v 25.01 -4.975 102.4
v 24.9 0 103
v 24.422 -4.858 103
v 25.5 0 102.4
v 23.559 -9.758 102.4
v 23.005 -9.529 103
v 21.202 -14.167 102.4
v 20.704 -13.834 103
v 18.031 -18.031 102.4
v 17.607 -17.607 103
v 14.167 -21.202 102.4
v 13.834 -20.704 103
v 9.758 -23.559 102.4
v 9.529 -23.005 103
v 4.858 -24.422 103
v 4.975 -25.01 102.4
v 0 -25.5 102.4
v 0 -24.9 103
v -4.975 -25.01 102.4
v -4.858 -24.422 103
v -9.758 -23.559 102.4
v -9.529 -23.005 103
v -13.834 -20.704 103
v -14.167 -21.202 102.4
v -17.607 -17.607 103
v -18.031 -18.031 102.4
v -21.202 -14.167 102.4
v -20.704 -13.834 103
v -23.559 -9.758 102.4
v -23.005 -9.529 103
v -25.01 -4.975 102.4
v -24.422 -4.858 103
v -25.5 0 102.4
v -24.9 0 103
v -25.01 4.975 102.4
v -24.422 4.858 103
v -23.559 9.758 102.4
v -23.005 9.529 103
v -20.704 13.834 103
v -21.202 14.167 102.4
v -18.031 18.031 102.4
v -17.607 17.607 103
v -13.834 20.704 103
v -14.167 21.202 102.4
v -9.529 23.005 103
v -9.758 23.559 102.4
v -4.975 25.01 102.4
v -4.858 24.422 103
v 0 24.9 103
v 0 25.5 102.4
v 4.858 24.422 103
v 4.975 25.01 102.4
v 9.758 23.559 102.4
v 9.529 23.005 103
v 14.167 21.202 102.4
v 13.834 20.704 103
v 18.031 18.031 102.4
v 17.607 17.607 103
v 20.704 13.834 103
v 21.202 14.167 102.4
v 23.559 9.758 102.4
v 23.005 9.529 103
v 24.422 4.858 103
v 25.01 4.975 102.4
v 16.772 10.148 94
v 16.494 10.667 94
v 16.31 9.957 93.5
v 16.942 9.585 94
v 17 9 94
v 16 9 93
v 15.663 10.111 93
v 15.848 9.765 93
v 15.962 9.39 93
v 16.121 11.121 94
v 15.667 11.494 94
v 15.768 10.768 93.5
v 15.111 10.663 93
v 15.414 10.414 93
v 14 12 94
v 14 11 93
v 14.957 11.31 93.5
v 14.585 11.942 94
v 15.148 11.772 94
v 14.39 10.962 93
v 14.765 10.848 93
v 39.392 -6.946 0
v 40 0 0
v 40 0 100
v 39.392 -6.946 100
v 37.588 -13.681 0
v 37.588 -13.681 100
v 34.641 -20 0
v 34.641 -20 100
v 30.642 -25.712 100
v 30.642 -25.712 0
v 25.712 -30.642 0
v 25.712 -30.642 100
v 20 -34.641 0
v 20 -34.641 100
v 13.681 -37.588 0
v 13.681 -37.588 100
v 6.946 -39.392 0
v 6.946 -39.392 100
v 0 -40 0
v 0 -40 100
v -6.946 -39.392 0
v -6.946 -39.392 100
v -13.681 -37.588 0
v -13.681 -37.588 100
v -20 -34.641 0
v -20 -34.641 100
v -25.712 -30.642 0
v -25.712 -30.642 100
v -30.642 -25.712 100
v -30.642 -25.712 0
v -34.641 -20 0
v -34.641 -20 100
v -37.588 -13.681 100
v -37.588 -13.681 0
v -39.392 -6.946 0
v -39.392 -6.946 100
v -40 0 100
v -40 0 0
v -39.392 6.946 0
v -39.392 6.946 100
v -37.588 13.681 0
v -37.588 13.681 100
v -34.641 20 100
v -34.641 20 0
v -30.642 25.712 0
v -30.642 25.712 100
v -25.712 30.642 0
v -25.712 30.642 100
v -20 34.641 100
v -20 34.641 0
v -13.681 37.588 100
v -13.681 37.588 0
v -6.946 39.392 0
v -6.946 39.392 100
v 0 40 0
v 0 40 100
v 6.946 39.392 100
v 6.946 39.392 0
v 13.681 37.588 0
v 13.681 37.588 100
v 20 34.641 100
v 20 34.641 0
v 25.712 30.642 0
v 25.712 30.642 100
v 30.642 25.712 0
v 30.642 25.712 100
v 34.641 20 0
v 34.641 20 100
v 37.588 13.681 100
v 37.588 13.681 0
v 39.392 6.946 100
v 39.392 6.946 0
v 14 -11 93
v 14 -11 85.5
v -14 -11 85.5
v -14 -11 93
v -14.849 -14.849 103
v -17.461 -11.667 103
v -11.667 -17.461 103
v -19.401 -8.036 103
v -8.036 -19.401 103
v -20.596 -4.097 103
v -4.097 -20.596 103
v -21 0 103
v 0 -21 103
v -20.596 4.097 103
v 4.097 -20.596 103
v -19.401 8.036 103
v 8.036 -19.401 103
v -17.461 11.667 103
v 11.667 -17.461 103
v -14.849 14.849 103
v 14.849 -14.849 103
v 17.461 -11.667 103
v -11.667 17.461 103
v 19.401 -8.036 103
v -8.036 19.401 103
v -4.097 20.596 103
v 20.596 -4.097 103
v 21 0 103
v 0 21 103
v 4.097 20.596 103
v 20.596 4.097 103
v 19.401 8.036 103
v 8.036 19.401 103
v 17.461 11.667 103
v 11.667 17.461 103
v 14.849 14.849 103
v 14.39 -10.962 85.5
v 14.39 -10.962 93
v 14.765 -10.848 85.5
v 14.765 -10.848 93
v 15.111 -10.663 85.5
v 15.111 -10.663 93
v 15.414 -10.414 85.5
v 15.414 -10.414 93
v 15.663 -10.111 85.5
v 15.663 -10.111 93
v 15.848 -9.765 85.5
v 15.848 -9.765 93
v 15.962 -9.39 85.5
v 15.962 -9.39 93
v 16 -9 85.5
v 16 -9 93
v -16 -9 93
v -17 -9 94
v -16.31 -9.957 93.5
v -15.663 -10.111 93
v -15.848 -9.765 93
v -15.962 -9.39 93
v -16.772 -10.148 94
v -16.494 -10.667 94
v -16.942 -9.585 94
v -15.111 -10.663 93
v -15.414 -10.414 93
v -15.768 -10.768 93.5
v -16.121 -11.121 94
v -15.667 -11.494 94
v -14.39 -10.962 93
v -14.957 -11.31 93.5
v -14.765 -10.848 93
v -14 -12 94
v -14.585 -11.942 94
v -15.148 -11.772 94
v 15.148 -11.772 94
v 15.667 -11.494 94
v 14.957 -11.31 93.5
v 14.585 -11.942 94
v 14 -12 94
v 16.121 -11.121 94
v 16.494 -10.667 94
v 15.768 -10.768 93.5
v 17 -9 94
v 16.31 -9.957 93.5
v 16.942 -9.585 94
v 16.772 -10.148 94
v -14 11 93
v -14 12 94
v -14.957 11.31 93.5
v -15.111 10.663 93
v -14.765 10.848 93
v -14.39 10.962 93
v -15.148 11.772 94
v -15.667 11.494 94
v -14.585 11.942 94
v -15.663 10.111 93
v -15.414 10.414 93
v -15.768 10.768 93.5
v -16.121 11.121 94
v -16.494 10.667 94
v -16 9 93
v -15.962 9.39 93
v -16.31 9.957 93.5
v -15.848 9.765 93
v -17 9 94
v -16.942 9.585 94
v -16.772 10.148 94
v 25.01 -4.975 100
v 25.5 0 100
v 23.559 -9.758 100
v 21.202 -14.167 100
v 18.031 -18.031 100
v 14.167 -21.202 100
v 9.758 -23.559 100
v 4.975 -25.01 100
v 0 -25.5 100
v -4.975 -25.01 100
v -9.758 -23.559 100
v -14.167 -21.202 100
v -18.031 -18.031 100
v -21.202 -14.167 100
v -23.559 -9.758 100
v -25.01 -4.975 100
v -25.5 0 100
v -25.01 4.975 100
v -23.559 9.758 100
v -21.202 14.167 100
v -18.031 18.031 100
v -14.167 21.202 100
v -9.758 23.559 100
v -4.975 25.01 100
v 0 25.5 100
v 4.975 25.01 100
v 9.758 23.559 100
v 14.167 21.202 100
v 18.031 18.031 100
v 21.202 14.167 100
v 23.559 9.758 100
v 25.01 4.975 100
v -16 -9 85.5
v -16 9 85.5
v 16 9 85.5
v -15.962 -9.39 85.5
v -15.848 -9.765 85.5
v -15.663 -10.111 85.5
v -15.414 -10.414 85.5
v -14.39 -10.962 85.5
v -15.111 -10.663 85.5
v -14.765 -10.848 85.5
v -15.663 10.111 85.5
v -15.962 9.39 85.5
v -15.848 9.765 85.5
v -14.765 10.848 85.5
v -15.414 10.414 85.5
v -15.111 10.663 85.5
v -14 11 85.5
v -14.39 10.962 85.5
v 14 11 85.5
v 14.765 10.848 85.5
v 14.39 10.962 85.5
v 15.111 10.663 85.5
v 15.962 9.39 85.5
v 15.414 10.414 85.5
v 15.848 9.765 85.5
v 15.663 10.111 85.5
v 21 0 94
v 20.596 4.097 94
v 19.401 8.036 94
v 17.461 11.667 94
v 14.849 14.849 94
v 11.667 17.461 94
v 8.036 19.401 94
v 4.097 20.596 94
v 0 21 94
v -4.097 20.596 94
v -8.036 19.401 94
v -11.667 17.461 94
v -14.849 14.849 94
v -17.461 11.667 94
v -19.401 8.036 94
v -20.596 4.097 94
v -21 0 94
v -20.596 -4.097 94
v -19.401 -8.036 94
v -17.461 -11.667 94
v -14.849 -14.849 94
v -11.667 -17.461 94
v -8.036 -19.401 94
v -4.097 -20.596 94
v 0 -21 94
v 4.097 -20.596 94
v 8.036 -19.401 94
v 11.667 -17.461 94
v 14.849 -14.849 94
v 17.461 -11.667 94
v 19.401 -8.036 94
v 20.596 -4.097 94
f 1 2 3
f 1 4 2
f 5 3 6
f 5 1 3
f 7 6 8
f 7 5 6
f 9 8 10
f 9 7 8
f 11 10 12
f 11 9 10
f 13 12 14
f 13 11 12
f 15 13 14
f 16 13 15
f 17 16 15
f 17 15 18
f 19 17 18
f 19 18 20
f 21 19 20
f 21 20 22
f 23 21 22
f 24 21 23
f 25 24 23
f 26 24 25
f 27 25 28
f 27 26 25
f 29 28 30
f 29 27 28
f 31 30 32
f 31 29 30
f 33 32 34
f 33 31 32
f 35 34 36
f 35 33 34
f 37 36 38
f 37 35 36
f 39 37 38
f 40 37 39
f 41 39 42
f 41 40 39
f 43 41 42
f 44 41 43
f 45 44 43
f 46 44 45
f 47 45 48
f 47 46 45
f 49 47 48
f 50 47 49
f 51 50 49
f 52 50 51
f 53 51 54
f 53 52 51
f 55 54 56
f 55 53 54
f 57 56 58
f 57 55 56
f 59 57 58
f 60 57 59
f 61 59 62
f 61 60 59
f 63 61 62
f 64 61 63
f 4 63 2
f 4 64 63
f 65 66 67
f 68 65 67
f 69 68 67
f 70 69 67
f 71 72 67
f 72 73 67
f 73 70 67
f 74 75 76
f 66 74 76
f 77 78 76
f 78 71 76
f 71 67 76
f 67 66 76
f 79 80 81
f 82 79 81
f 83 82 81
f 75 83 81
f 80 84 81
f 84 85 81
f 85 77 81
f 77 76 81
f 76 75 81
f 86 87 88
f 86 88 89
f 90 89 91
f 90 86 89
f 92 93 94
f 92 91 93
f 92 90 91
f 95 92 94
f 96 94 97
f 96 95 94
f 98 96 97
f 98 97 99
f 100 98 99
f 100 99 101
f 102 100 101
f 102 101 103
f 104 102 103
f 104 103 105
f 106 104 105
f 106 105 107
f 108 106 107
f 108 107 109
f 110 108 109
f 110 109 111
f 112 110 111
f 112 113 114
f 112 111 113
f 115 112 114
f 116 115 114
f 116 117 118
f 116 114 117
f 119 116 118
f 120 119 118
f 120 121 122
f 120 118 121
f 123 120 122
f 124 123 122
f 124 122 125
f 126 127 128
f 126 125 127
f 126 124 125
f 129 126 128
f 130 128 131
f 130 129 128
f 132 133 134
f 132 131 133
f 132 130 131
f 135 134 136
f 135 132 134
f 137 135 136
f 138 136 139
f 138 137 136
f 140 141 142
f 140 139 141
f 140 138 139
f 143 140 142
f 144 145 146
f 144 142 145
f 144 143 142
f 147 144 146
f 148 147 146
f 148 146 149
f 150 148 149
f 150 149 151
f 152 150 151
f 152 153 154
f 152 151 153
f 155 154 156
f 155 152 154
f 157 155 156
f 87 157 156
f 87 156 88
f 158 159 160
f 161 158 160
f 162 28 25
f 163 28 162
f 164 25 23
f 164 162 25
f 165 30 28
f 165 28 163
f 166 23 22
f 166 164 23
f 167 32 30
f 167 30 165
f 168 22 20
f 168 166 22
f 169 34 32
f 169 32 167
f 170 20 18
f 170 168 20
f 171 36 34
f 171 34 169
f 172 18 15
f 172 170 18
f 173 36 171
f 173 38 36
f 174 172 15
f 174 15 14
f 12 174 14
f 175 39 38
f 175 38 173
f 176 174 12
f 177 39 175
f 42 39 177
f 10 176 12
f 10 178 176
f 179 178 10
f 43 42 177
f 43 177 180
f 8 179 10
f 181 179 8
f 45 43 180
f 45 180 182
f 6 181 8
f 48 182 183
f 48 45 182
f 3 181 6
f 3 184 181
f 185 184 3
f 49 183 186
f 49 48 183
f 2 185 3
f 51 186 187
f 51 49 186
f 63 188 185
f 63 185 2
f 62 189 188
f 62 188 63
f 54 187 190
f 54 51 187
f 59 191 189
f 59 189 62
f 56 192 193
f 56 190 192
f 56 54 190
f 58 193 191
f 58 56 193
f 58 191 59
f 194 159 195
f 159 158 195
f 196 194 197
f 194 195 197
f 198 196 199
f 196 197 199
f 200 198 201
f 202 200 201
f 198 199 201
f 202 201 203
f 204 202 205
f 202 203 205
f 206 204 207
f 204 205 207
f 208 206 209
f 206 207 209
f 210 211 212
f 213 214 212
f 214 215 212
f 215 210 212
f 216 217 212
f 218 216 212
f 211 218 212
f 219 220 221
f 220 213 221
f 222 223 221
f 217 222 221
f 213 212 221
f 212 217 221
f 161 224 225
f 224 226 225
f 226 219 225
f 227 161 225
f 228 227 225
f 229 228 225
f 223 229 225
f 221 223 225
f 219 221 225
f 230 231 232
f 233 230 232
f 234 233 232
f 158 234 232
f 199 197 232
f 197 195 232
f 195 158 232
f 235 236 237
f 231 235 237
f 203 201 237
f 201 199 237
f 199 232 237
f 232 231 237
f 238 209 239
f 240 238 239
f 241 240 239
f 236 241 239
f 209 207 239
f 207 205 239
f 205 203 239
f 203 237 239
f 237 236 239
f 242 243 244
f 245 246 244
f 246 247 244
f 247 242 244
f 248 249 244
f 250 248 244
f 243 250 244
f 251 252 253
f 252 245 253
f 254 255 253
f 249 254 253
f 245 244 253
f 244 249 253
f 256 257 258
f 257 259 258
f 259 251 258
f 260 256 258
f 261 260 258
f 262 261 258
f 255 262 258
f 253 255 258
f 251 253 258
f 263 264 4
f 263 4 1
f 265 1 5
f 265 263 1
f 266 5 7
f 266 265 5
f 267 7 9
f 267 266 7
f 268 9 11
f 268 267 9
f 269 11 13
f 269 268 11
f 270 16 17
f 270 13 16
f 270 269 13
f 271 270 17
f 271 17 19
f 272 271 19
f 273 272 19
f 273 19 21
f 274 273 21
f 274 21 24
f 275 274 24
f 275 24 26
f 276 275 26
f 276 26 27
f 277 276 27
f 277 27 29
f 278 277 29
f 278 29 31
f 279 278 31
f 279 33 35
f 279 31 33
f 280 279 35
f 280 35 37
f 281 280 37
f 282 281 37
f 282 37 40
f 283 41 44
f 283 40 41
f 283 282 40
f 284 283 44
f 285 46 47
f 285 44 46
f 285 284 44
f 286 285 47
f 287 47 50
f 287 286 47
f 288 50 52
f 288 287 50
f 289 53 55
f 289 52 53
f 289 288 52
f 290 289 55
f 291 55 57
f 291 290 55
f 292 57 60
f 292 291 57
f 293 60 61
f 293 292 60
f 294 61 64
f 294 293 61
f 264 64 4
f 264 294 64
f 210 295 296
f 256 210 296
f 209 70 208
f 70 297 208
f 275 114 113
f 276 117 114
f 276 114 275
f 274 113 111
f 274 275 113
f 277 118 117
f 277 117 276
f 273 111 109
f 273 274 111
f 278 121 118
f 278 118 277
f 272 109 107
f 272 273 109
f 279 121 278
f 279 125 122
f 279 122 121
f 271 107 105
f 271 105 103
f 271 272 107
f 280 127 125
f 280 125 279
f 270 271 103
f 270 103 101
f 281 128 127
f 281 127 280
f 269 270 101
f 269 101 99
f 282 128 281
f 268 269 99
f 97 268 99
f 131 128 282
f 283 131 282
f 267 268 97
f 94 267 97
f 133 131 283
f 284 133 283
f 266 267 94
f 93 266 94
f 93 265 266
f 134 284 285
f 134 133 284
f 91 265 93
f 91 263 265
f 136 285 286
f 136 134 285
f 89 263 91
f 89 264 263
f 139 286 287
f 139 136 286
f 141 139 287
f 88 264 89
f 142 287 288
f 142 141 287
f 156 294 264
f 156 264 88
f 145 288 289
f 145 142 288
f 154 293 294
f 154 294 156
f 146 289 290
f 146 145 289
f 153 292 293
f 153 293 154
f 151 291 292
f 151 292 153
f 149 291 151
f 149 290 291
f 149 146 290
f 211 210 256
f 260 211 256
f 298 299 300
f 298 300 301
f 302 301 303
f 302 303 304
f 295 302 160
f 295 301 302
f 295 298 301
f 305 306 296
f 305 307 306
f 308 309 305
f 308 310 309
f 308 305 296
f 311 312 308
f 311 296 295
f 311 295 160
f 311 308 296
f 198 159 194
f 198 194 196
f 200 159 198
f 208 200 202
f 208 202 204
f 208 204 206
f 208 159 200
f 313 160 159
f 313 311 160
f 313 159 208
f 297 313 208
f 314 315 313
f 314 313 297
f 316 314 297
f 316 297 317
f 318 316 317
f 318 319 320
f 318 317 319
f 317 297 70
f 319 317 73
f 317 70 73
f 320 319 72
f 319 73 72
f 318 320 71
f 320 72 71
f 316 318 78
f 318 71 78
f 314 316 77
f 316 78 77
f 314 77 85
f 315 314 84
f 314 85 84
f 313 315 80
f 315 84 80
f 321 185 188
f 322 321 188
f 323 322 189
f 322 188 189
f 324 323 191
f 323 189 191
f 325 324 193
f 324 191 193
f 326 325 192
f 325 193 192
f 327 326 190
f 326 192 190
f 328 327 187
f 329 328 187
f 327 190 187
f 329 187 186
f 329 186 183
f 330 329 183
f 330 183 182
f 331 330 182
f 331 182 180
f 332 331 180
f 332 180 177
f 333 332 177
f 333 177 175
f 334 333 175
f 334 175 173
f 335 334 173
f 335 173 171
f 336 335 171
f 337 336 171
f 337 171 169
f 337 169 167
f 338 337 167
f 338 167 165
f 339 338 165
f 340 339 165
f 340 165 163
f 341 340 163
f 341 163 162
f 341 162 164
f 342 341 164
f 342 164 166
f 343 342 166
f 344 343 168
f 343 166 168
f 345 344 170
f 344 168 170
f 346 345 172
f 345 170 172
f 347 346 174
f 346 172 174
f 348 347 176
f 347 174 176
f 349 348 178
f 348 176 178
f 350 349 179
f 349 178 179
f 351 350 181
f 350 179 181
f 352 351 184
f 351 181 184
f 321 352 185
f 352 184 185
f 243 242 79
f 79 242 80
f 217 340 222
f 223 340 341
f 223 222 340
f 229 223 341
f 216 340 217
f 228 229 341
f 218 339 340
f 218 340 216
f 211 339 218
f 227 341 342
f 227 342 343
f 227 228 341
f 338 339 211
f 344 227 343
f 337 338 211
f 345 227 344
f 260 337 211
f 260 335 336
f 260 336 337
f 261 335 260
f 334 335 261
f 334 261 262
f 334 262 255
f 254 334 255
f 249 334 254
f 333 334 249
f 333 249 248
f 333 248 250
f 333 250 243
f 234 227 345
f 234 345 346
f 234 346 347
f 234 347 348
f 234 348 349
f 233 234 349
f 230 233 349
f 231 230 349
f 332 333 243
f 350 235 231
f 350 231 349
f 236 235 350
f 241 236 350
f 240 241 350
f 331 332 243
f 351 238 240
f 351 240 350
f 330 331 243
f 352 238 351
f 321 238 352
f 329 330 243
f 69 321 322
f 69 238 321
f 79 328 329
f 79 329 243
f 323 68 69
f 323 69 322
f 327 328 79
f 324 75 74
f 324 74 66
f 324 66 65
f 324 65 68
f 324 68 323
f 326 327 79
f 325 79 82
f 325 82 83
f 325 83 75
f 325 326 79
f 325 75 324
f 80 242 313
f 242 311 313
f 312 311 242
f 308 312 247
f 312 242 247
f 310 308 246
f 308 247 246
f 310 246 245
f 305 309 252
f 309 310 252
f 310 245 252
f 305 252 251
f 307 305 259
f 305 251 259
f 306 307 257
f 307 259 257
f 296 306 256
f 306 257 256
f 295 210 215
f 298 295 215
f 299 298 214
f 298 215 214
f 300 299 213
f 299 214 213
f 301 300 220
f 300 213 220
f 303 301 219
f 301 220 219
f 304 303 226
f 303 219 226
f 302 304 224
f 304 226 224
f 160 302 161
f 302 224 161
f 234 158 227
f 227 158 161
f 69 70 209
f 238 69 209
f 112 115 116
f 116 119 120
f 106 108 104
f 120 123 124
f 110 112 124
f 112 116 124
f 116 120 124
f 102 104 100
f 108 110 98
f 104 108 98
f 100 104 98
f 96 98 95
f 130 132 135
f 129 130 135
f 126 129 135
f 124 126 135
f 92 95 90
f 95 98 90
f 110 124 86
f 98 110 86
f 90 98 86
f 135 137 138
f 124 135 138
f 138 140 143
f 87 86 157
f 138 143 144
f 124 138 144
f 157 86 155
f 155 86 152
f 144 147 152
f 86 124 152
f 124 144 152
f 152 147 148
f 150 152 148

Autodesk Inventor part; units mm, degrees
ref_plane "YZ Plane" through (0, 0, 0) normal (1, 0, 0) x (0, 1, 0)
ref_plane "XZ Plane" through (0, 0, 0) normal (0, 1, 0) x (-1, 0, 0)
ref_plane "XY Plane" through (0, 0, 0) normal (0, 0, 1) x (1, 0, 0)
sketch "Sketch1" plane through (0, 0, 0) normal (0, 0, 1) x (1, 0, 0)
  circle A0 centre (0, 0) radius 40
  dimension "d0" = 80
extrude "Extrusion1" add sketch "Sketch1" along normal blind 100
sketch "Sketch2" plane through (0, 0, 100) normal (0, 0, 1) x (1, 0, 0)
  circle A0 centre (0, 0) radius 25.5
  dimension "d3" = 51
extrude "Extrusion2" add sketch "Sketch2" along normal blind 3
chamfer "Chamfer1" distance 0.6 angle 45 1 edges at (-25.5, 0, 103)
sketch "Sketch3" plane through (0, 0, 103) normal (0, 0, 1) x (1, 0, 0)
  circle A0 centre (0, 0) radius 21
  dimension "d9" = 42
extrude "SensorCutout" cut sketch "Sketch3" against normal blind 17.5
thread "Thread1" size "M42x1" class "6H" standard "ANSI Metric M Profile" full length
sketch "Sketch4" plane through (0, 0, 85.5) normal (0, 0, 1) x (1, 0, 0)
  line L0 (-16, 11) -> (16, 11)
  line L1 (16, 11) -> (16, -11)
  line L2 (16, -11) -> (-16, -11)
  line L3 (-16, -11) -> (-16, 11)
  circle A0 centre (0, 0) radius 21 projected
  point P0 (16, 0)
  point P1 (0, 11)
  dimension "d14" = 32
  dimension "d15" = 22
extrude "SensorFrame" add sketch "Sketch4" along normal blind 8.5
fillet "Fillet1" radius 2 4 edges at (-16, 11, 89.75) (-16, -11, 89.75) (16, 11, 89.75) (16, -11, 89.75)
chamfer "Chamfer2" distance 1 angle 45 4 edges at (0, 11, 94) (16, 0, 94) (0, -11, 94) (-16, 0, 94)
properties part number "RisingCam-IMX571"
